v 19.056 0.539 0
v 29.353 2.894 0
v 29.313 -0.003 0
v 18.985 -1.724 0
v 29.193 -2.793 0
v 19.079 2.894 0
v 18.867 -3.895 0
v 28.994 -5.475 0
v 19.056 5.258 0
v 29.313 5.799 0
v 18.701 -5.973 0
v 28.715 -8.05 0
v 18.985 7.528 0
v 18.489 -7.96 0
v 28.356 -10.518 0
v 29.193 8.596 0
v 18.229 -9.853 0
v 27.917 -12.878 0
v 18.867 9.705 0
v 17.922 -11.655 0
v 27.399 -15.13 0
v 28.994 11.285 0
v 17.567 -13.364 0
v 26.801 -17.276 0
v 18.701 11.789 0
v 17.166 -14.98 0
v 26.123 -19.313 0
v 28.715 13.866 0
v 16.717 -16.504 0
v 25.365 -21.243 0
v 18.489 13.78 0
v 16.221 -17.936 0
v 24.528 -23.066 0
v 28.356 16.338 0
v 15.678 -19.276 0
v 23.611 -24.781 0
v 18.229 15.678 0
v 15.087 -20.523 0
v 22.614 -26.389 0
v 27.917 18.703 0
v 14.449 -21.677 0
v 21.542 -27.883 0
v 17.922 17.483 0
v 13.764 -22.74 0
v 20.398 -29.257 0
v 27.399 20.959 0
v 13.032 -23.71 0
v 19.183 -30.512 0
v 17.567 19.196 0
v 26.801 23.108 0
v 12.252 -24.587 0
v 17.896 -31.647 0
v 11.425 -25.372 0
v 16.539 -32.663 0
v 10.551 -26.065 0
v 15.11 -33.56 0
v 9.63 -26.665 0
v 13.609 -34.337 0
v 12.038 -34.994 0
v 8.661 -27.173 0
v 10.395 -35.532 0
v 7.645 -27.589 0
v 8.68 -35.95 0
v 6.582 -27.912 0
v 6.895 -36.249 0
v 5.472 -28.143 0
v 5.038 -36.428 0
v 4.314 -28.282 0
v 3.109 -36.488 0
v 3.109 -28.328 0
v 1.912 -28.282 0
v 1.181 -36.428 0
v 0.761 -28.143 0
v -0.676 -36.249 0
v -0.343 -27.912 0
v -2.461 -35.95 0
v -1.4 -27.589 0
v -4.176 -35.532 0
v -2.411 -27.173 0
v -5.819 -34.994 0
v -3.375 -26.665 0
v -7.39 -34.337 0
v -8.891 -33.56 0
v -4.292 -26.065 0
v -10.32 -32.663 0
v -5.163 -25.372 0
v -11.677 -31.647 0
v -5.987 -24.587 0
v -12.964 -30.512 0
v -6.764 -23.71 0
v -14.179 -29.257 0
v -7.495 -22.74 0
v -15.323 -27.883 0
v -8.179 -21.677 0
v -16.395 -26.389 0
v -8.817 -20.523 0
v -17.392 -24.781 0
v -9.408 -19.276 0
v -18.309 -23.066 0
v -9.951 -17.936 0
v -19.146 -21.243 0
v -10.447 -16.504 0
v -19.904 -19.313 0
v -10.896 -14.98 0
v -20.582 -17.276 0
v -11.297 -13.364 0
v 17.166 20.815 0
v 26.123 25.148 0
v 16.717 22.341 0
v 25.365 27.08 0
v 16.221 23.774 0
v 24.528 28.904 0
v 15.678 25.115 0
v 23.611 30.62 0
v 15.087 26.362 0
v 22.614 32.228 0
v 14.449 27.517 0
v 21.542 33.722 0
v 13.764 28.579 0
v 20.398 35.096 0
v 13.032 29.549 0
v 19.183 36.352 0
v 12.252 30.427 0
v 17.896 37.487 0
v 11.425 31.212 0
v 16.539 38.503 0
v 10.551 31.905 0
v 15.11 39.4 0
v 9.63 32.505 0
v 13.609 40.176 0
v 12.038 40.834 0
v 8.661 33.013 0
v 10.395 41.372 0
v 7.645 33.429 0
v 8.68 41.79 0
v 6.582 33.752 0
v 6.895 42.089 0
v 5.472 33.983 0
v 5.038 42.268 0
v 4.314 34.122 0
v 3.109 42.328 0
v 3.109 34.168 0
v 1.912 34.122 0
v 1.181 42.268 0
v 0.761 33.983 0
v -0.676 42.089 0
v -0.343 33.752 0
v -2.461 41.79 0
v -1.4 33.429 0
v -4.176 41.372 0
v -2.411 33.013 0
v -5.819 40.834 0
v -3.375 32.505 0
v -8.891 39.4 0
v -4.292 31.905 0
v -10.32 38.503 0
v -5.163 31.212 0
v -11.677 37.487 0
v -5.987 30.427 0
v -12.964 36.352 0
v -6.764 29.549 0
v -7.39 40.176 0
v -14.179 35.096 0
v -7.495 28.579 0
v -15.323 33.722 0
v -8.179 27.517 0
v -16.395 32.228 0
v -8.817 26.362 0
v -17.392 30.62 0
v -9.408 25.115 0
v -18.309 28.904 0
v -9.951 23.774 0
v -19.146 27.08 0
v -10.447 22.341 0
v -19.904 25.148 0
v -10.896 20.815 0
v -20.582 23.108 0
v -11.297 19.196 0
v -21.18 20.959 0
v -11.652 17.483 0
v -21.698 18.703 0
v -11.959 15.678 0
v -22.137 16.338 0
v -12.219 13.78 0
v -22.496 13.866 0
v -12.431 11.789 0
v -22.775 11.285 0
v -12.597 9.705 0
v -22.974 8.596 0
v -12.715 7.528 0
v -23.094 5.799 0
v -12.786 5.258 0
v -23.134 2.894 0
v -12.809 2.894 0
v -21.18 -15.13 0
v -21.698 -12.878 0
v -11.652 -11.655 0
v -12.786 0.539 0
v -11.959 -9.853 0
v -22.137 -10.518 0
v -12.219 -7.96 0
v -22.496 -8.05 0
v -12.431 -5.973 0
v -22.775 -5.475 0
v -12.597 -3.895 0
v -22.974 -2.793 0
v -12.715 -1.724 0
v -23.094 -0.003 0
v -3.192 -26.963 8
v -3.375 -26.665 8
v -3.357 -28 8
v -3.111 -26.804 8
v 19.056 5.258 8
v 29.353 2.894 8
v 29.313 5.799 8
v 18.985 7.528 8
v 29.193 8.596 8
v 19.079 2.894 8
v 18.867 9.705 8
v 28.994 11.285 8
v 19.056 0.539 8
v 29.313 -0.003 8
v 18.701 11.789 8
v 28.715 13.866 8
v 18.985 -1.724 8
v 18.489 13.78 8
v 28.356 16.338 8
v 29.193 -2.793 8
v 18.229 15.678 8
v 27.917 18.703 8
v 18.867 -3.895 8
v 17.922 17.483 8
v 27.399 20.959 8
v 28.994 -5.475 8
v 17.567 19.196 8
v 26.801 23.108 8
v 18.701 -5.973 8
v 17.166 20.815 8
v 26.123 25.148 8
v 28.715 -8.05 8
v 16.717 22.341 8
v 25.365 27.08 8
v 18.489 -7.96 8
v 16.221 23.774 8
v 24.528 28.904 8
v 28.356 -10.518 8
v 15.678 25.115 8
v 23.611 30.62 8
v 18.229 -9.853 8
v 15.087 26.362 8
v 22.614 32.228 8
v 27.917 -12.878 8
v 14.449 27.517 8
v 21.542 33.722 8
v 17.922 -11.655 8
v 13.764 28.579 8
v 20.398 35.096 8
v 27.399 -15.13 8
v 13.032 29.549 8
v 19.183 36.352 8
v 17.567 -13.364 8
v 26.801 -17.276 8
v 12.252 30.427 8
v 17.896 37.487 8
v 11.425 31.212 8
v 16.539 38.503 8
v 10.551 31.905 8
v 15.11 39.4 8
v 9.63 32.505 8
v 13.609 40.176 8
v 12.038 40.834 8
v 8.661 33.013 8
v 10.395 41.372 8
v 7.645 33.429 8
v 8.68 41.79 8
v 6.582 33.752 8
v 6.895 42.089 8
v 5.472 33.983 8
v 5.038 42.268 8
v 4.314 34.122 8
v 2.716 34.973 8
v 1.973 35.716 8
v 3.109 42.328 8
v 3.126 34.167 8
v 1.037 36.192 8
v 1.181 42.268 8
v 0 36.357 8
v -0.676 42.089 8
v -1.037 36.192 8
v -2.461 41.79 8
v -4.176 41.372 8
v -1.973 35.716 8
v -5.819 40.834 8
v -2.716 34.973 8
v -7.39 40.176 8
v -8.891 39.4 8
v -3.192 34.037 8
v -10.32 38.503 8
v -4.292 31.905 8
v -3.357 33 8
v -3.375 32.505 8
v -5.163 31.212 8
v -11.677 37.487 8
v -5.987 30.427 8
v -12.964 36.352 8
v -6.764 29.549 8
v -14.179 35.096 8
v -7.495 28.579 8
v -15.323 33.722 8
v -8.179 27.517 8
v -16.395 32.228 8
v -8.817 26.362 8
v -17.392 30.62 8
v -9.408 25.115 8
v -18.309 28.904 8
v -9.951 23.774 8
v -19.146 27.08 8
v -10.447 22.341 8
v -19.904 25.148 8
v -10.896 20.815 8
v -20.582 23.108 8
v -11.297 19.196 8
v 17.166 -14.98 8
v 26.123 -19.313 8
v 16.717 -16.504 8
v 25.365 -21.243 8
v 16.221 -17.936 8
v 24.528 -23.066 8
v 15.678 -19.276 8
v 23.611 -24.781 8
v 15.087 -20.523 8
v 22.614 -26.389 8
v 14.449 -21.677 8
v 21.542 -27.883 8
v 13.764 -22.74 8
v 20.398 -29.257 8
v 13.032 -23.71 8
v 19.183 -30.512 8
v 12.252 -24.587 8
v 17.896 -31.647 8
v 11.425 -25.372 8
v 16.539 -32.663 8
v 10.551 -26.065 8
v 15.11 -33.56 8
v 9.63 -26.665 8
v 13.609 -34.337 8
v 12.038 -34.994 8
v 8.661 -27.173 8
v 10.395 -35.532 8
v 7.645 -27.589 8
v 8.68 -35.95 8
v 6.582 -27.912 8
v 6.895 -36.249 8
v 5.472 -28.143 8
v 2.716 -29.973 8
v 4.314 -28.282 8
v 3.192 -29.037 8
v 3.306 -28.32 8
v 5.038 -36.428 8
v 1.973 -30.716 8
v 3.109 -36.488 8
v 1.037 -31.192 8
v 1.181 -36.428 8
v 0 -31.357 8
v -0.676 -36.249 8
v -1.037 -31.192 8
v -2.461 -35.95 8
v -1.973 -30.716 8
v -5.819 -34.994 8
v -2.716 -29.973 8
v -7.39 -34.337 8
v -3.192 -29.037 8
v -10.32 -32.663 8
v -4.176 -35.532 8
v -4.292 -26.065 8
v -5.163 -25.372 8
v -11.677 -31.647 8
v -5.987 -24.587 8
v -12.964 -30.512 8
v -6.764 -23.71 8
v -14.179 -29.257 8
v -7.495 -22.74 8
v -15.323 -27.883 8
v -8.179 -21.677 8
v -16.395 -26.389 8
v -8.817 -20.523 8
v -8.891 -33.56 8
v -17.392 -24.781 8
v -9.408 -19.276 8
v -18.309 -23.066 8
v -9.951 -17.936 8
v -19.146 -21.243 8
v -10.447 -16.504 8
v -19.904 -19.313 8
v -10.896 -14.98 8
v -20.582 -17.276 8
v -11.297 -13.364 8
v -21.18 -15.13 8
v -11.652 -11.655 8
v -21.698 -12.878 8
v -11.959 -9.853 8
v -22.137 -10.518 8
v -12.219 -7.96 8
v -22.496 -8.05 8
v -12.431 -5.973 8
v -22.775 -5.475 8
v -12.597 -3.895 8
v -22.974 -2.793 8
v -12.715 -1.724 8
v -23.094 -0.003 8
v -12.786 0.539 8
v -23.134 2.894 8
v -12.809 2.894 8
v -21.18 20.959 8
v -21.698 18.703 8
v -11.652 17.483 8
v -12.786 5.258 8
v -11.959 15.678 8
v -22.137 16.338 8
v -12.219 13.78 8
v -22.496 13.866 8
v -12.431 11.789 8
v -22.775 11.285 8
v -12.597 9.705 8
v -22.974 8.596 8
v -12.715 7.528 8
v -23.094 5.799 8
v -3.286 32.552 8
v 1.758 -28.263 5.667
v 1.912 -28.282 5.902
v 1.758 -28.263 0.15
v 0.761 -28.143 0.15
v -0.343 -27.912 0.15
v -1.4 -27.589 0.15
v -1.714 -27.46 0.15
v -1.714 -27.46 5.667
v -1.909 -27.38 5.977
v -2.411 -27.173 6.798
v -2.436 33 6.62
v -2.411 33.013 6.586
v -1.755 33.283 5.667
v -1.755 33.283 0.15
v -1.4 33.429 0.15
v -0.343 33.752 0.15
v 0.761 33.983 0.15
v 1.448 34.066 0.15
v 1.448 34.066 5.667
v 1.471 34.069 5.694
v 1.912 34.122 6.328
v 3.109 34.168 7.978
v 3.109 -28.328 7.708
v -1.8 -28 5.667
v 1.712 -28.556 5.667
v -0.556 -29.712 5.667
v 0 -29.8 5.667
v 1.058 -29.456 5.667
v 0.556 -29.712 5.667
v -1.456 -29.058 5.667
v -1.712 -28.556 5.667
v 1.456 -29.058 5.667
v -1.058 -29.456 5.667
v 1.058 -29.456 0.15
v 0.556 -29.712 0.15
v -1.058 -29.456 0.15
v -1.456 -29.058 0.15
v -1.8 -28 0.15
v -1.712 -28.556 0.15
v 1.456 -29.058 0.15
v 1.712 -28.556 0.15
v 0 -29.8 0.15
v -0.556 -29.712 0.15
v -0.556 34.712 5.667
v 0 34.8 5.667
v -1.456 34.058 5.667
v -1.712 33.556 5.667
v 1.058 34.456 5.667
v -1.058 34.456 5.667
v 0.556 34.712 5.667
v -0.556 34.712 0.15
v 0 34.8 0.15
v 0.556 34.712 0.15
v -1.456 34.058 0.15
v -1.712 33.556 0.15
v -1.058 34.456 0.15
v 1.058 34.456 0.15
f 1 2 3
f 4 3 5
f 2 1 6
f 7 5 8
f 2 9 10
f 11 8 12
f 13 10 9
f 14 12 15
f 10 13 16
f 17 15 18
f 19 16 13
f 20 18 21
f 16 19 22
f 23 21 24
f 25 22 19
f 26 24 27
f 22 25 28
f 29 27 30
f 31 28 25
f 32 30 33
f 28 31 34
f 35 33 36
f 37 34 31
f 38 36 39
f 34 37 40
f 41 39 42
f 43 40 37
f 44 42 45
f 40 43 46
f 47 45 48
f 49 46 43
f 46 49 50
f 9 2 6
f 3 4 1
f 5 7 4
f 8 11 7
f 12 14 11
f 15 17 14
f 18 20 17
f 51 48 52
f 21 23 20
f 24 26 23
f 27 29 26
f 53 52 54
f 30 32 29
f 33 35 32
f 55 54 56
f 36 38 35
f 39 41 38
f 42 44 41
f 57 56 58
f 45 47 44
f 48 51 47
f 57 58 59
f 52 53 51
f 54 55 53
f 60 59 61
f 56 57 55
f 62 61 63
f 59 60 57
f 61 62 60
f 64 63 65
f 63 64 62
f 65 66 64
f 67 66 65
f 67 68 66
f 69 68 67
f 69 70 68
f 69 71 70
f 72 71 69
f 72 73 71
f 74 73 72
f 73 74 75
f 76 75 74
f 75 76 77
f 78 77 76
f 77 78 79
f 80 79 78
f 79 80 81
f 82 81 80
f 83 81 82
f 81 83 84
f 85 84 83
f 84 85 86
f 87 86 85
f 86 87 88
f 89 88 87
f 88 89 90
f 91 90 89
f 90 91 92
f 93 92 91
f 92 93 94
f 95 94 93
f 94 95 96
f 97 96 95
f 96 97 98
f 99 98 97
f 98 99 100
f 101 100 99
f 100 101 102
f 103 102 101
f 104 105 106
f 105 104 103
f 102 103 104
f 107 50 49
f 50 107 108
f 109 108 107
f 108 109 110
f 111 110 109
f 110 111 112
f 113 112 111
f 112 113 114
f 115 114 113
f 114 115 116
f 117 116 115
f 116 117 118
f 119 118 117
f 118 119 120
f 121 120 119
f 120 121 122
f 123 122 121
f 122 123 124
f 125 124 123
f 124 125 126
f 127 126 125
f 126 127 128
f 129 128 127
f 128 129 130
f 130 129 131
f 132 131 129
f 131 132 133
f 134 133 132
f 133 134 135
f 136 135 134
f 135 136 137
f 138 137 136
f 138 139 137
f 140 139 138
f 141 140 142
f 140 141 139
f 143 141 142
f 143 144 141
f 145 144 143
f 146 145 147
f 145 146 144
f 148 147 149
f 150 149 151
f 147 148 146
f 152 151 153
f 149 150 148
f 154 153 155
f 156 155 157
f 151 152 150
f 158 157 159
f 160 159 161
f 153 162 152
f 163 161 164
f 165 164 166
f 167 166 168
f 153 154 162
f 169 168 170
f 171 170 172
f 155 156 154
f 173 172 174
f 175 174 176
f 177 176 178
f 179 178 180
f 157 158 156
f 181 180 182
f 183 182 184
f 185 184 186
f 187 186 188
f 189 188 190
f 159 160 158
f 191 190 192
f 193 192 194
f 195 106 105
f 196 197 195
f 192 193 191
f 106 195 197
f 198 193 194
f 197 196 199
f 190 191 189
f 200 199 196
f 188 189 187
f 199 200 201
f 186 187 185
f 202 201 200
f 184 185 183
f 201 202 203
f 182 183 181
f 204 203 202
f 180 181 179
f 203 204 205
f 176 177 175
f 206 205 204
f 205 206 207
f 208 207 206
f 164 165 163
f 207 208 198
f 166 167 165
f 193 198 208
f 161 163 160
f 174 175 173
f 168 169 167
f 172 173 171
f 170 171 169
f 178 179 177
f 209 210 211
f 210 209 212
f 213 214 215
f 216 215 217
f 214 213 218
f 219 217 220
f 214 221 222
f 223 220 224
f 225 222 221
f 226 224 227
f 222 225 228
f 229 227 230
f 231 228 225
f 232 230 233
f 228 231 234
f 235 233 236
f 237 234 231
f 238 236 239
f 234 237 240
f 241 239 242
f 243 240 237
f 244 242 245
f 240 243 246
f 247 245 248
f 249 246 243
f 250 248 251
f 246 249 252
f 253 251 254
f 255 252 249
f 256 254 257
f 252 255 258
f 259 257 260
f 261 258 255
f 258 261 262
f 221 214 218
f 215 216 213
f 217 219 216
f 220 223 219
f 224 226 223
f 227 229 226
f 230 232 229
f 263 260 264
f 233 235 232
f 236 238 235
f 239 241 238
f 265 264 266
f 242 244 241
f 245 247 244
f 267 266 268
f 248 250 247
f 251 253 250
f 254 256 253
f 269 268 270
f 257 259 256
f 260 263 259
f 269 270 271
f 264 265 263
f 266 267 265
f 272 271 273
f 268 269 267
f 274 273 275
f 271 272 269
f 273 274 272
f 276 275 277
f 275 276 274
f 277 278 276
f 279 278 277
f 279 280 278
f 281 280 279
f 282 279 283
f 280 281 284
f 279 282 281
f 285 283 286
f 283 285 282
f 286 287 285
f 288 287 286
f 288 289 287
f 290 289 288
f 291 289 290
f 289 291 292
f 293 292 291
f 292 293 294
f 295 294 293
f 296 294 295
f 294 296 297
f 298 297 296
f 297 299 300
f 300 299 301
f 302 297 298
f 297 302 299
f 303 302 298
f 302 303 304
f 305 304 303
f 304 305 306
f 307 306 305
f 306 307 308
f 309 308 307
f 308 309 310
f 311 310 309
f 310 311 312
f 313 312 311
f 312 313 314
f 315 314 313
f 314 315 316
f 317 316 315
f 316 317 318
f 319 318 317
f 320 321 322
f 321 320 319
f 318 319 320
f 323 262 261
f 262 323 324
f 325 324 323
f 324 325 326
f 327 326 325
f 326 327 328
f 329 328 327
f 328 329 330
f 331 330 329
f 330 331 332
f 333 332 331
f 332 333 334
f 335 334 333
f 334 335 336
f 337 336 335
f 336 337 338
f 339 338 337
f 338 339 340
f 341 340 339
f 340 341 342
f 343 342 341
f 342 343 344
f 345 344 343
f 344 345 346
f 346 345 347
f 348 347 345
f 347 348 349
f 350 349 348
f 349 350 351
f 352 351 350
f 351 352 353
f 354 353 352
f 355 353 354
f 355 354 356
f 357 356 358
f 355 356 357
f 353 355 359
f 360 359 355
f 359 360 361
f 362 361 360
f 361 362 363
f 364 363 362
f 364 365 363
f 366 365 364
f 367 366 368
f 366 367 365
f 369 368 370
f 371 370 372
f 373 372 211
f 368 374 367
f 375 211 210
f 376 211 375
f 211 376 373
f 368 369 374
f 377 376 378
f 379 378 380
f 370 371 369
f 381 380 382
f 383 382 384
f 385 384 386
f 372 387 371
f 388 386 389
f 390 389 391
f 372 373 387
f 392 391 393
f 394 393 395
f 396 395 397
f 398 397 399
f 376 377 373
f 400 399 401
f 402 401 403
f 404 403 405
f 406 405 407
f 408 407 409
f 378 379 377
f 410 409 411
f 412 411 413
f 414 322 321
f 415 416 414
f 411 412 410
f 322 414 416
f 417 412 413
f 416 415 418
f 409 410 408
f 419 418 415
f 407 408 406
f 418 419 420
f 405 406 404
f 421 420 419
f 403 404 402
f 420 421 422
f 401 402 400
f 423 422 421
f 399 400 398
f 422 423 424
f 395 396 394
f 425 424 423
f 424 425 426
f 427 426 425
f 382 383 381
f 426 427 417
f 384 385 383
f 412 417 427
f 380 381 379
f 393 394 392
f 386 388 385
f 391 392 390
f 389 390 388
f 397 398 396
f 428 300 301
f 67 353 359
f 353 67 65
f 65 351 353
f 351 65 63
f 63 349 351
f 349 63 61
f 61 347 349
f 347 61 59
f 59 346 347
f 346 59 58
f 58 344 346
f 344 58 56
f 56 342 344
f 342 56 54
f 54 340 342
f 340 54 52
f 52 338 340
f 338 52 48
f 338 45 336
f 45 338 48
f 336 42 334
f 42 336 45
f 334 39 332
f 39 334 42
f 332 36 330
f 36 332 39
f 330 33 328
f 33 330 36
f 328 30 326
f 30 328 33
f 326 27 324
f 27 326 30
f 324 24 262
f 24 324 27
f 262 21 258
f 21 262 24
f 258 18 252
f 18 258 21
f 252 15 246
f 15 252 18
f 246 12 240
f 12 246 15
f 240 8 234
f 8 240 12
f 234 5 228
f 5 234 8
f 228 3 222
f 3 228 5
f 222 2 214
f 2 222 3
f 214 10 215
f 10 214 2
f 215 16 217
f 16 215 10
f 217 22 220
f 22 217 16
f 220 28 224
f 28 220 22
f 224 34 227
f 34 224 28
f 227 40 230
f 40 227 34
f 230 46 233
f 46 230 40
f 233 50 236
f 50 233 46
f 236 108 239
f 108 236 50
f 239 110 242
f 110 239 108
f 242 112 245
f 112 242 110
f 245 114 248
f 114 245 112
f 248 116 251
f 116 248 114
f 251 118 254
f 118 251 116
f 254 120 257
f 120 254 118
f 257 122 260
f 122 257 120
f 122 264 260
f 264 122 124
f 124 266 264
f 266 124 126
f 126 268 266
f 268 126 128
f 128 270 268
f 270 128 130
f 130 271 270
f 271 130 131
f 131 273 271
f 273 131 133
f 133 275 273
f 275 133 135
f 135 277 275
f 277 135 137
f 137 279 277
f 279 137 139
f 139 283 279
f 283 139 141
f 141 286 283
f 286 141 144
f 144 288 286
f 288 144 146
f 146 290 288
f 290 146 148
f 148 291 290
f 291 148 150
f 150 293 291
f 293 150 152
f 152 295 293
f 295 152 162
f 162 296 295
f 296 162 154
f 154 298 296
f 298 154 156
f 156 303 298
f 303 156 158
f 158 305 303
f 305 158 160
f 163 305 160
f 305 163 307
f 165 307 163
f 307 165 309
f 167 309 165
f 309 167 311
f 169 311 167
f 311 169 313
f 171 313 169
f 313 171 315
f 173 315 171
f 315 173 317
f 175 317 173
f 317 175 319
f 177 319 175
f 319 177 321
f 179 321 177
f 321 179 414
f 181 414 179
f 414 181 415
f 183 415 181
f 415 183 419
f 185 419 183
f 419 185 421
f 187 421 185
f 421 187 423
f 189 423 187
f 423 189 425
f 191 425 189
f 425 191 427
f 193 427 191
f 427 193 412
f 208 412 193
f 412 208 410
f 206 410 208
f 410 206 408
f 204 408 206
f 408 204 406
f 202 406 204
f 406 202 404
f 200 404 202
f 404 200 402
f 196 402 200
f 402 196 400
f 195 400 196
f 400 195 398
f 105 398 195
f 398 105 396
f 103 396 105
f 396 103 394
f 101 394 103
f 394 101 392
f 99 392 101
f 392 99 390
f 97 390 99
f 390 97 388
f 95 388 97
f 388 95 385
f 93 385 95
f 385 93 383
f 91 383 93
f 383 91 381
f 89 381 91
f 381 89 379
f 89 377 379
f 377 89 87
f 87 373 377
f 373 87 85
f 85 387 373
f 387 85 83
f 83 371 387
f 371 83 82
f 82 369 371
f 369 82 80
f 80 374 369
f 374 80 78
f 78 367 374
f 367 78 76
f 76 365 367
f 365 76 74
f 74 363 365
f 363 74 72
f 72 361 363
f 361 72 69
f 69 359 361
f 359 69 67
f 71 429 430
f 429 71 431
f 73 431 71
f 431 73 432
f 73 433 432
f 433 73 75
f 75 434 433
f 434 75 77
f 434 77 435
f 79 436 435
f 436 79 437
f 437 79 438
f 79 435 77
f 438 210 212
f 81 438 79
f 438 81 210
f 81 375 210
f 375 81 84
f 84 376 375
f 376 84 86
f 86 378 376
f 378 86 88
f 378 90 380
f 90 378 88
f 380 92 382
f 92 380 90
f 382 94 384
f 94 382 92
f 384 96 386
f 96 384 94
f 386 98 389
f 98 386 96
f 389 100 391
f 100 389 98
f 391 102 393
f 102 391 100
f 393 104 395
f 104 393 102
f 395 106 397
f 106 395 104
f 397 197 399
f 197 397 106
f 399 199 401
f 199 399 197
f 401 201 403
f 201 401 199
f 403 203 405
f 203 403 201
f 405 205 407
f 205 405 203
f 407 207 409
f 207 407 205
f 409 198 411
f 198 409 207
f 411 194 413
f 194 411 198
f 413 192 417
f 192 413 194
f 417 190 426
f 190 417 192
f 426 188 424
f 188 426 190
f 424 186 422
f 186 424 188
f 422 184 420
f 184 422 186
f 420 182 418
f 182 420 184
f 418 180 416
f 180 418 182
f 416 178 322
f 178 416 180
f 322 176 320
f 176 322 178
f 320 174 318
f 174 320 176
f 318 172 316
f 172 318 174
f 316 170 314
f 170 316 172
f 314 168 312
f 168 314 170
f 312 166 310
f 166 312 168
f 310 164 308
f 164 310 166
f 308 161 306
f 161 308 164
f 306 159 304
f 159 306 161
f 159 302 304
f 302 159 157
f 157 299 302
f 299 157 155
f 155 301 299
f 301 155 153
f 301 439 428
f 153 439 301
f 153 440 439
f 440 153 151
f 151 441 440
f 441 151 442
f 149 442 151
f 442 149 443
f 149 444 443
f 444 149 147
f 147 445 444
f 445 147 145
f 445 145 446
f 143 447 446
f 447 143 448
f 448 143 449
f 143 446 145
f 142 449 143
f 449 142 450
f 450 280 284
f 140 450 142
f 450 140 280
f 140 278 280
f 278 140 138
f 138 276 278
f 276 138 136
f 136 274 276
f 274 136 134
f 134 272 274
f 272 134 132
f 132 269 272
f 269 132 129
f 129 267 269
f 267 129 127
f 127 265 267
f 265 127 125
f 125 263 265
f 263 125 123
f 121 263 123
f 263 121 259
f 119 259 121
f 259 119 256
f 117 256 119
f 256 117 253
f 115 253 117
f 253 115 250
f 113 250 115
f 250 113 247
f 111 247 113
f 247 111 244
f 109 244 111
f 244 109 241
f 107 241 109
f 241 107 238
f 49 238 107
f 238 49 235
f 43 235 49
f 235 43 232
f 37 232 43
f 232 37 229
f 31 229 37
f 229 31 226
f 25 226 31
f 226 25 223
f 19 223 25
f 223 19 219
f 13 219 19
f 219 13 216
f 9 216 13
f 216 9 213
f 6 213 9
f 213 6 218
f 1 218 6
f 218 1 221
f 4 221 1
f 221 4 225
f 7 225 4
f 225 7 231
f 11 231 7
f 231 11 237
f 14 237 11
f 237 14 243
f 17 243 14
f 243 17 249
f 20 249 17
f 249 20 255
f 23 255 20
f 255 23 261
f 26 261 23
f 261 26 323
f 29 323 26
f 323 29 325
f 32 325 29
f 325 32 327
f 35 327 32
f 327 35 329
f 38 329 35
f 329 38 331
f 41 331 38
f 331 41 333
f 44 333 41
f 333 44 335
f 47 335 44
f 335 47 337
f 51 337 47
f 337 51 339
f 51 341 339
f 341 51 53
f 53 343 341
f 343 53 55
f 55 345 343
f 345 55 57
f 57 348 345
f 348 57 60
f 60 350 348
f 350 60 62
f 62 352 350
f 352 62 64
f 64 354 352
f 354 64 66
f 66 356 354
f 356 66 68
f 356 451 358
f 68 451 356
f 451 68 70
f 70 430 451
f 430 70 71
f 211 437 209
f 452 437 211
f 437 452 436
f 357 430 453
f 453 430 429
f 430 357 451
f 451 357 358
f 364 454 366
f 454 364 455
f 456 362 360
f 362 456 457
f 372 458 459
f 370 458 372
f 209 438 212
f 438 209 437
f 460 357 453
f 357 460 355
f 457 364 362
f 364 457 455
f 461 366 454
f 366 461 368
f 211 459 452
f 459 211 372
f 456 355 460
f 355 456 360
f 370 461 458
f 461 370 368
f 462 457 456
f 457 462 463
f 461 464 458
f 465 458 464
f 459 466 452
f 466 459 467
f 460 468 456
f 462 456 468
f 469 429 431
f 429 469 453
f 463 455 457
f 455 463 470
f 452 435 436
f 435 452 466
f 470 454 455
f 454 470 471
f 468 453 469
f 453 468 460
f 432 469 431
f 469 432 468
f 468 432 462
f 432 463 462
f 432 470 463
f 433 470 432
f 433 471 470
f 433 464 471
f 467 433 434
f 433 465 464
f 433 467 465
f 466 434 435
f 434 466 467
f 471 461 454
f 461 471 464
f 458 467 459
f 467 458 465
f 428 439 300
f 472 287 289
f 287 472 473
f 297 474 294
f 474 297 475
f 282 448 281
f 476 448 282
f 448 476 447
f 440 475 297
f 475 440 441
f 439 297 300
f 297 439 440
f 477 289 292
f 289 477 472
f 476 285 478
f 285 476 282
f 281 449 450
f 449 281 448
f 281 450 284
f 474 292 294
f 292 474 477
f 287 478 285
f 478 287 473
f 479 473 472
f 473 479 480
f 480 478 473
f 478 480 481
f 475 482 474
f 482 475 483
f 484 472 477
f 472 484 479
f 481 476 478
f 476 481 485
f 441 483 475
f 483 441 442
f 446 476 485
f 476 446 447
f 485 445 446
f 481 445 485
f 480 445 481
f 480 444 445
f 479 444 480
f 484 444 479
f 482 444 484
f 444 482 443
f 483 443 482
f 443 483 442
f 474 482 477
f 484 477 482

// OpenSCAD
// Street Numbers for 3D printing
// Charles Tilford, 2019
// License: CC BY-NC-SA 4.0
//   https://creativecommons.org/licenses/by-nc-sa/4.0/

char="0";     // The number/letter to print

// Units are in mm, except for height of letter

// How many inches high should letter be?
inchesHigh=3;
// How thick/deep should letter be (mm)?
depth=8;

// Character coordinates just center the letter
charX=-30;    // Character X coord
charY=-35;    // Character Y coord
topScrew=33;  // Top screw Y coord
botScrew=-28; // Bottom screw Y coord
height=8;     // Thickness of character
// Screw dimensions. Default presumes
// #6 sheet metal screw
screwWid=3.6; // Width of screw shaft
screwTop=6.78;// Width of screw head
screwCon=5.08;// Height of head 'cone'

// Font to print in. Your system needs this
// installed, of course. If changed the hole
// positions almost certainly need to be
// changed, and maybe charX/charY.
fName="Open Sans Extrabold";
// https://fonts.google.com/specimen/Open+Sans
// Designer: Steve Matteson

// Thin floor below holes. My printer was
// struggling to have the hole 'border' stick
// to the stage. Just drill/screw thru it.
holeFloor=0.15; 

// ==========================================
// ===== All values below are auto-calculated
// ==========================================

// Scaled values
scaleFactor=inchesHigh / 3;
cX=charX * scaleFactor;
cY=charY * scaleFactor;
tS=topScrew * scaleFactor;
bS=botScrew * scaleFactor;
// Where do we start drawing screw head cone?
oS=depth - (screwCon-.05);

difference() {
  // We use difference() to punch out the screw holes
  // in the character
    
  // The character itself, 8mm thick
  translate([cX,cY,0])
    linear_extrude(height=depth, scale=1)
    text(char, size=(75*scaleFactor),
         $fn=100, font=fName);
    
  // Bottom screw hole
  translate([0,bS,oS]) color("red")
    cylinder(h=screwCon, d2=screwTop,
             d1=0, $fn=20);
   translate([0,bS,holeFloor])
    cylinder(h=20, d=screwWid, $fn=20);
    
  // Top screw hole
  translate([0,tS,oS]) color("red")
    cylinder(h=screwCon, d2=screwTop,
             d1=0, $fn=20);
  translate([0,tS,holeFloor])
    cylinder(h=20, d=screwWid, $fn=20);
}

// Colors are just to aid visualization of
// void spaces. $fn is "featuer number", ie how
// many polygons are devoted to object. The values
// above should be near your printing limit anyway.

// Developed in OpenSCAD
//    https://www.openscad.org/
